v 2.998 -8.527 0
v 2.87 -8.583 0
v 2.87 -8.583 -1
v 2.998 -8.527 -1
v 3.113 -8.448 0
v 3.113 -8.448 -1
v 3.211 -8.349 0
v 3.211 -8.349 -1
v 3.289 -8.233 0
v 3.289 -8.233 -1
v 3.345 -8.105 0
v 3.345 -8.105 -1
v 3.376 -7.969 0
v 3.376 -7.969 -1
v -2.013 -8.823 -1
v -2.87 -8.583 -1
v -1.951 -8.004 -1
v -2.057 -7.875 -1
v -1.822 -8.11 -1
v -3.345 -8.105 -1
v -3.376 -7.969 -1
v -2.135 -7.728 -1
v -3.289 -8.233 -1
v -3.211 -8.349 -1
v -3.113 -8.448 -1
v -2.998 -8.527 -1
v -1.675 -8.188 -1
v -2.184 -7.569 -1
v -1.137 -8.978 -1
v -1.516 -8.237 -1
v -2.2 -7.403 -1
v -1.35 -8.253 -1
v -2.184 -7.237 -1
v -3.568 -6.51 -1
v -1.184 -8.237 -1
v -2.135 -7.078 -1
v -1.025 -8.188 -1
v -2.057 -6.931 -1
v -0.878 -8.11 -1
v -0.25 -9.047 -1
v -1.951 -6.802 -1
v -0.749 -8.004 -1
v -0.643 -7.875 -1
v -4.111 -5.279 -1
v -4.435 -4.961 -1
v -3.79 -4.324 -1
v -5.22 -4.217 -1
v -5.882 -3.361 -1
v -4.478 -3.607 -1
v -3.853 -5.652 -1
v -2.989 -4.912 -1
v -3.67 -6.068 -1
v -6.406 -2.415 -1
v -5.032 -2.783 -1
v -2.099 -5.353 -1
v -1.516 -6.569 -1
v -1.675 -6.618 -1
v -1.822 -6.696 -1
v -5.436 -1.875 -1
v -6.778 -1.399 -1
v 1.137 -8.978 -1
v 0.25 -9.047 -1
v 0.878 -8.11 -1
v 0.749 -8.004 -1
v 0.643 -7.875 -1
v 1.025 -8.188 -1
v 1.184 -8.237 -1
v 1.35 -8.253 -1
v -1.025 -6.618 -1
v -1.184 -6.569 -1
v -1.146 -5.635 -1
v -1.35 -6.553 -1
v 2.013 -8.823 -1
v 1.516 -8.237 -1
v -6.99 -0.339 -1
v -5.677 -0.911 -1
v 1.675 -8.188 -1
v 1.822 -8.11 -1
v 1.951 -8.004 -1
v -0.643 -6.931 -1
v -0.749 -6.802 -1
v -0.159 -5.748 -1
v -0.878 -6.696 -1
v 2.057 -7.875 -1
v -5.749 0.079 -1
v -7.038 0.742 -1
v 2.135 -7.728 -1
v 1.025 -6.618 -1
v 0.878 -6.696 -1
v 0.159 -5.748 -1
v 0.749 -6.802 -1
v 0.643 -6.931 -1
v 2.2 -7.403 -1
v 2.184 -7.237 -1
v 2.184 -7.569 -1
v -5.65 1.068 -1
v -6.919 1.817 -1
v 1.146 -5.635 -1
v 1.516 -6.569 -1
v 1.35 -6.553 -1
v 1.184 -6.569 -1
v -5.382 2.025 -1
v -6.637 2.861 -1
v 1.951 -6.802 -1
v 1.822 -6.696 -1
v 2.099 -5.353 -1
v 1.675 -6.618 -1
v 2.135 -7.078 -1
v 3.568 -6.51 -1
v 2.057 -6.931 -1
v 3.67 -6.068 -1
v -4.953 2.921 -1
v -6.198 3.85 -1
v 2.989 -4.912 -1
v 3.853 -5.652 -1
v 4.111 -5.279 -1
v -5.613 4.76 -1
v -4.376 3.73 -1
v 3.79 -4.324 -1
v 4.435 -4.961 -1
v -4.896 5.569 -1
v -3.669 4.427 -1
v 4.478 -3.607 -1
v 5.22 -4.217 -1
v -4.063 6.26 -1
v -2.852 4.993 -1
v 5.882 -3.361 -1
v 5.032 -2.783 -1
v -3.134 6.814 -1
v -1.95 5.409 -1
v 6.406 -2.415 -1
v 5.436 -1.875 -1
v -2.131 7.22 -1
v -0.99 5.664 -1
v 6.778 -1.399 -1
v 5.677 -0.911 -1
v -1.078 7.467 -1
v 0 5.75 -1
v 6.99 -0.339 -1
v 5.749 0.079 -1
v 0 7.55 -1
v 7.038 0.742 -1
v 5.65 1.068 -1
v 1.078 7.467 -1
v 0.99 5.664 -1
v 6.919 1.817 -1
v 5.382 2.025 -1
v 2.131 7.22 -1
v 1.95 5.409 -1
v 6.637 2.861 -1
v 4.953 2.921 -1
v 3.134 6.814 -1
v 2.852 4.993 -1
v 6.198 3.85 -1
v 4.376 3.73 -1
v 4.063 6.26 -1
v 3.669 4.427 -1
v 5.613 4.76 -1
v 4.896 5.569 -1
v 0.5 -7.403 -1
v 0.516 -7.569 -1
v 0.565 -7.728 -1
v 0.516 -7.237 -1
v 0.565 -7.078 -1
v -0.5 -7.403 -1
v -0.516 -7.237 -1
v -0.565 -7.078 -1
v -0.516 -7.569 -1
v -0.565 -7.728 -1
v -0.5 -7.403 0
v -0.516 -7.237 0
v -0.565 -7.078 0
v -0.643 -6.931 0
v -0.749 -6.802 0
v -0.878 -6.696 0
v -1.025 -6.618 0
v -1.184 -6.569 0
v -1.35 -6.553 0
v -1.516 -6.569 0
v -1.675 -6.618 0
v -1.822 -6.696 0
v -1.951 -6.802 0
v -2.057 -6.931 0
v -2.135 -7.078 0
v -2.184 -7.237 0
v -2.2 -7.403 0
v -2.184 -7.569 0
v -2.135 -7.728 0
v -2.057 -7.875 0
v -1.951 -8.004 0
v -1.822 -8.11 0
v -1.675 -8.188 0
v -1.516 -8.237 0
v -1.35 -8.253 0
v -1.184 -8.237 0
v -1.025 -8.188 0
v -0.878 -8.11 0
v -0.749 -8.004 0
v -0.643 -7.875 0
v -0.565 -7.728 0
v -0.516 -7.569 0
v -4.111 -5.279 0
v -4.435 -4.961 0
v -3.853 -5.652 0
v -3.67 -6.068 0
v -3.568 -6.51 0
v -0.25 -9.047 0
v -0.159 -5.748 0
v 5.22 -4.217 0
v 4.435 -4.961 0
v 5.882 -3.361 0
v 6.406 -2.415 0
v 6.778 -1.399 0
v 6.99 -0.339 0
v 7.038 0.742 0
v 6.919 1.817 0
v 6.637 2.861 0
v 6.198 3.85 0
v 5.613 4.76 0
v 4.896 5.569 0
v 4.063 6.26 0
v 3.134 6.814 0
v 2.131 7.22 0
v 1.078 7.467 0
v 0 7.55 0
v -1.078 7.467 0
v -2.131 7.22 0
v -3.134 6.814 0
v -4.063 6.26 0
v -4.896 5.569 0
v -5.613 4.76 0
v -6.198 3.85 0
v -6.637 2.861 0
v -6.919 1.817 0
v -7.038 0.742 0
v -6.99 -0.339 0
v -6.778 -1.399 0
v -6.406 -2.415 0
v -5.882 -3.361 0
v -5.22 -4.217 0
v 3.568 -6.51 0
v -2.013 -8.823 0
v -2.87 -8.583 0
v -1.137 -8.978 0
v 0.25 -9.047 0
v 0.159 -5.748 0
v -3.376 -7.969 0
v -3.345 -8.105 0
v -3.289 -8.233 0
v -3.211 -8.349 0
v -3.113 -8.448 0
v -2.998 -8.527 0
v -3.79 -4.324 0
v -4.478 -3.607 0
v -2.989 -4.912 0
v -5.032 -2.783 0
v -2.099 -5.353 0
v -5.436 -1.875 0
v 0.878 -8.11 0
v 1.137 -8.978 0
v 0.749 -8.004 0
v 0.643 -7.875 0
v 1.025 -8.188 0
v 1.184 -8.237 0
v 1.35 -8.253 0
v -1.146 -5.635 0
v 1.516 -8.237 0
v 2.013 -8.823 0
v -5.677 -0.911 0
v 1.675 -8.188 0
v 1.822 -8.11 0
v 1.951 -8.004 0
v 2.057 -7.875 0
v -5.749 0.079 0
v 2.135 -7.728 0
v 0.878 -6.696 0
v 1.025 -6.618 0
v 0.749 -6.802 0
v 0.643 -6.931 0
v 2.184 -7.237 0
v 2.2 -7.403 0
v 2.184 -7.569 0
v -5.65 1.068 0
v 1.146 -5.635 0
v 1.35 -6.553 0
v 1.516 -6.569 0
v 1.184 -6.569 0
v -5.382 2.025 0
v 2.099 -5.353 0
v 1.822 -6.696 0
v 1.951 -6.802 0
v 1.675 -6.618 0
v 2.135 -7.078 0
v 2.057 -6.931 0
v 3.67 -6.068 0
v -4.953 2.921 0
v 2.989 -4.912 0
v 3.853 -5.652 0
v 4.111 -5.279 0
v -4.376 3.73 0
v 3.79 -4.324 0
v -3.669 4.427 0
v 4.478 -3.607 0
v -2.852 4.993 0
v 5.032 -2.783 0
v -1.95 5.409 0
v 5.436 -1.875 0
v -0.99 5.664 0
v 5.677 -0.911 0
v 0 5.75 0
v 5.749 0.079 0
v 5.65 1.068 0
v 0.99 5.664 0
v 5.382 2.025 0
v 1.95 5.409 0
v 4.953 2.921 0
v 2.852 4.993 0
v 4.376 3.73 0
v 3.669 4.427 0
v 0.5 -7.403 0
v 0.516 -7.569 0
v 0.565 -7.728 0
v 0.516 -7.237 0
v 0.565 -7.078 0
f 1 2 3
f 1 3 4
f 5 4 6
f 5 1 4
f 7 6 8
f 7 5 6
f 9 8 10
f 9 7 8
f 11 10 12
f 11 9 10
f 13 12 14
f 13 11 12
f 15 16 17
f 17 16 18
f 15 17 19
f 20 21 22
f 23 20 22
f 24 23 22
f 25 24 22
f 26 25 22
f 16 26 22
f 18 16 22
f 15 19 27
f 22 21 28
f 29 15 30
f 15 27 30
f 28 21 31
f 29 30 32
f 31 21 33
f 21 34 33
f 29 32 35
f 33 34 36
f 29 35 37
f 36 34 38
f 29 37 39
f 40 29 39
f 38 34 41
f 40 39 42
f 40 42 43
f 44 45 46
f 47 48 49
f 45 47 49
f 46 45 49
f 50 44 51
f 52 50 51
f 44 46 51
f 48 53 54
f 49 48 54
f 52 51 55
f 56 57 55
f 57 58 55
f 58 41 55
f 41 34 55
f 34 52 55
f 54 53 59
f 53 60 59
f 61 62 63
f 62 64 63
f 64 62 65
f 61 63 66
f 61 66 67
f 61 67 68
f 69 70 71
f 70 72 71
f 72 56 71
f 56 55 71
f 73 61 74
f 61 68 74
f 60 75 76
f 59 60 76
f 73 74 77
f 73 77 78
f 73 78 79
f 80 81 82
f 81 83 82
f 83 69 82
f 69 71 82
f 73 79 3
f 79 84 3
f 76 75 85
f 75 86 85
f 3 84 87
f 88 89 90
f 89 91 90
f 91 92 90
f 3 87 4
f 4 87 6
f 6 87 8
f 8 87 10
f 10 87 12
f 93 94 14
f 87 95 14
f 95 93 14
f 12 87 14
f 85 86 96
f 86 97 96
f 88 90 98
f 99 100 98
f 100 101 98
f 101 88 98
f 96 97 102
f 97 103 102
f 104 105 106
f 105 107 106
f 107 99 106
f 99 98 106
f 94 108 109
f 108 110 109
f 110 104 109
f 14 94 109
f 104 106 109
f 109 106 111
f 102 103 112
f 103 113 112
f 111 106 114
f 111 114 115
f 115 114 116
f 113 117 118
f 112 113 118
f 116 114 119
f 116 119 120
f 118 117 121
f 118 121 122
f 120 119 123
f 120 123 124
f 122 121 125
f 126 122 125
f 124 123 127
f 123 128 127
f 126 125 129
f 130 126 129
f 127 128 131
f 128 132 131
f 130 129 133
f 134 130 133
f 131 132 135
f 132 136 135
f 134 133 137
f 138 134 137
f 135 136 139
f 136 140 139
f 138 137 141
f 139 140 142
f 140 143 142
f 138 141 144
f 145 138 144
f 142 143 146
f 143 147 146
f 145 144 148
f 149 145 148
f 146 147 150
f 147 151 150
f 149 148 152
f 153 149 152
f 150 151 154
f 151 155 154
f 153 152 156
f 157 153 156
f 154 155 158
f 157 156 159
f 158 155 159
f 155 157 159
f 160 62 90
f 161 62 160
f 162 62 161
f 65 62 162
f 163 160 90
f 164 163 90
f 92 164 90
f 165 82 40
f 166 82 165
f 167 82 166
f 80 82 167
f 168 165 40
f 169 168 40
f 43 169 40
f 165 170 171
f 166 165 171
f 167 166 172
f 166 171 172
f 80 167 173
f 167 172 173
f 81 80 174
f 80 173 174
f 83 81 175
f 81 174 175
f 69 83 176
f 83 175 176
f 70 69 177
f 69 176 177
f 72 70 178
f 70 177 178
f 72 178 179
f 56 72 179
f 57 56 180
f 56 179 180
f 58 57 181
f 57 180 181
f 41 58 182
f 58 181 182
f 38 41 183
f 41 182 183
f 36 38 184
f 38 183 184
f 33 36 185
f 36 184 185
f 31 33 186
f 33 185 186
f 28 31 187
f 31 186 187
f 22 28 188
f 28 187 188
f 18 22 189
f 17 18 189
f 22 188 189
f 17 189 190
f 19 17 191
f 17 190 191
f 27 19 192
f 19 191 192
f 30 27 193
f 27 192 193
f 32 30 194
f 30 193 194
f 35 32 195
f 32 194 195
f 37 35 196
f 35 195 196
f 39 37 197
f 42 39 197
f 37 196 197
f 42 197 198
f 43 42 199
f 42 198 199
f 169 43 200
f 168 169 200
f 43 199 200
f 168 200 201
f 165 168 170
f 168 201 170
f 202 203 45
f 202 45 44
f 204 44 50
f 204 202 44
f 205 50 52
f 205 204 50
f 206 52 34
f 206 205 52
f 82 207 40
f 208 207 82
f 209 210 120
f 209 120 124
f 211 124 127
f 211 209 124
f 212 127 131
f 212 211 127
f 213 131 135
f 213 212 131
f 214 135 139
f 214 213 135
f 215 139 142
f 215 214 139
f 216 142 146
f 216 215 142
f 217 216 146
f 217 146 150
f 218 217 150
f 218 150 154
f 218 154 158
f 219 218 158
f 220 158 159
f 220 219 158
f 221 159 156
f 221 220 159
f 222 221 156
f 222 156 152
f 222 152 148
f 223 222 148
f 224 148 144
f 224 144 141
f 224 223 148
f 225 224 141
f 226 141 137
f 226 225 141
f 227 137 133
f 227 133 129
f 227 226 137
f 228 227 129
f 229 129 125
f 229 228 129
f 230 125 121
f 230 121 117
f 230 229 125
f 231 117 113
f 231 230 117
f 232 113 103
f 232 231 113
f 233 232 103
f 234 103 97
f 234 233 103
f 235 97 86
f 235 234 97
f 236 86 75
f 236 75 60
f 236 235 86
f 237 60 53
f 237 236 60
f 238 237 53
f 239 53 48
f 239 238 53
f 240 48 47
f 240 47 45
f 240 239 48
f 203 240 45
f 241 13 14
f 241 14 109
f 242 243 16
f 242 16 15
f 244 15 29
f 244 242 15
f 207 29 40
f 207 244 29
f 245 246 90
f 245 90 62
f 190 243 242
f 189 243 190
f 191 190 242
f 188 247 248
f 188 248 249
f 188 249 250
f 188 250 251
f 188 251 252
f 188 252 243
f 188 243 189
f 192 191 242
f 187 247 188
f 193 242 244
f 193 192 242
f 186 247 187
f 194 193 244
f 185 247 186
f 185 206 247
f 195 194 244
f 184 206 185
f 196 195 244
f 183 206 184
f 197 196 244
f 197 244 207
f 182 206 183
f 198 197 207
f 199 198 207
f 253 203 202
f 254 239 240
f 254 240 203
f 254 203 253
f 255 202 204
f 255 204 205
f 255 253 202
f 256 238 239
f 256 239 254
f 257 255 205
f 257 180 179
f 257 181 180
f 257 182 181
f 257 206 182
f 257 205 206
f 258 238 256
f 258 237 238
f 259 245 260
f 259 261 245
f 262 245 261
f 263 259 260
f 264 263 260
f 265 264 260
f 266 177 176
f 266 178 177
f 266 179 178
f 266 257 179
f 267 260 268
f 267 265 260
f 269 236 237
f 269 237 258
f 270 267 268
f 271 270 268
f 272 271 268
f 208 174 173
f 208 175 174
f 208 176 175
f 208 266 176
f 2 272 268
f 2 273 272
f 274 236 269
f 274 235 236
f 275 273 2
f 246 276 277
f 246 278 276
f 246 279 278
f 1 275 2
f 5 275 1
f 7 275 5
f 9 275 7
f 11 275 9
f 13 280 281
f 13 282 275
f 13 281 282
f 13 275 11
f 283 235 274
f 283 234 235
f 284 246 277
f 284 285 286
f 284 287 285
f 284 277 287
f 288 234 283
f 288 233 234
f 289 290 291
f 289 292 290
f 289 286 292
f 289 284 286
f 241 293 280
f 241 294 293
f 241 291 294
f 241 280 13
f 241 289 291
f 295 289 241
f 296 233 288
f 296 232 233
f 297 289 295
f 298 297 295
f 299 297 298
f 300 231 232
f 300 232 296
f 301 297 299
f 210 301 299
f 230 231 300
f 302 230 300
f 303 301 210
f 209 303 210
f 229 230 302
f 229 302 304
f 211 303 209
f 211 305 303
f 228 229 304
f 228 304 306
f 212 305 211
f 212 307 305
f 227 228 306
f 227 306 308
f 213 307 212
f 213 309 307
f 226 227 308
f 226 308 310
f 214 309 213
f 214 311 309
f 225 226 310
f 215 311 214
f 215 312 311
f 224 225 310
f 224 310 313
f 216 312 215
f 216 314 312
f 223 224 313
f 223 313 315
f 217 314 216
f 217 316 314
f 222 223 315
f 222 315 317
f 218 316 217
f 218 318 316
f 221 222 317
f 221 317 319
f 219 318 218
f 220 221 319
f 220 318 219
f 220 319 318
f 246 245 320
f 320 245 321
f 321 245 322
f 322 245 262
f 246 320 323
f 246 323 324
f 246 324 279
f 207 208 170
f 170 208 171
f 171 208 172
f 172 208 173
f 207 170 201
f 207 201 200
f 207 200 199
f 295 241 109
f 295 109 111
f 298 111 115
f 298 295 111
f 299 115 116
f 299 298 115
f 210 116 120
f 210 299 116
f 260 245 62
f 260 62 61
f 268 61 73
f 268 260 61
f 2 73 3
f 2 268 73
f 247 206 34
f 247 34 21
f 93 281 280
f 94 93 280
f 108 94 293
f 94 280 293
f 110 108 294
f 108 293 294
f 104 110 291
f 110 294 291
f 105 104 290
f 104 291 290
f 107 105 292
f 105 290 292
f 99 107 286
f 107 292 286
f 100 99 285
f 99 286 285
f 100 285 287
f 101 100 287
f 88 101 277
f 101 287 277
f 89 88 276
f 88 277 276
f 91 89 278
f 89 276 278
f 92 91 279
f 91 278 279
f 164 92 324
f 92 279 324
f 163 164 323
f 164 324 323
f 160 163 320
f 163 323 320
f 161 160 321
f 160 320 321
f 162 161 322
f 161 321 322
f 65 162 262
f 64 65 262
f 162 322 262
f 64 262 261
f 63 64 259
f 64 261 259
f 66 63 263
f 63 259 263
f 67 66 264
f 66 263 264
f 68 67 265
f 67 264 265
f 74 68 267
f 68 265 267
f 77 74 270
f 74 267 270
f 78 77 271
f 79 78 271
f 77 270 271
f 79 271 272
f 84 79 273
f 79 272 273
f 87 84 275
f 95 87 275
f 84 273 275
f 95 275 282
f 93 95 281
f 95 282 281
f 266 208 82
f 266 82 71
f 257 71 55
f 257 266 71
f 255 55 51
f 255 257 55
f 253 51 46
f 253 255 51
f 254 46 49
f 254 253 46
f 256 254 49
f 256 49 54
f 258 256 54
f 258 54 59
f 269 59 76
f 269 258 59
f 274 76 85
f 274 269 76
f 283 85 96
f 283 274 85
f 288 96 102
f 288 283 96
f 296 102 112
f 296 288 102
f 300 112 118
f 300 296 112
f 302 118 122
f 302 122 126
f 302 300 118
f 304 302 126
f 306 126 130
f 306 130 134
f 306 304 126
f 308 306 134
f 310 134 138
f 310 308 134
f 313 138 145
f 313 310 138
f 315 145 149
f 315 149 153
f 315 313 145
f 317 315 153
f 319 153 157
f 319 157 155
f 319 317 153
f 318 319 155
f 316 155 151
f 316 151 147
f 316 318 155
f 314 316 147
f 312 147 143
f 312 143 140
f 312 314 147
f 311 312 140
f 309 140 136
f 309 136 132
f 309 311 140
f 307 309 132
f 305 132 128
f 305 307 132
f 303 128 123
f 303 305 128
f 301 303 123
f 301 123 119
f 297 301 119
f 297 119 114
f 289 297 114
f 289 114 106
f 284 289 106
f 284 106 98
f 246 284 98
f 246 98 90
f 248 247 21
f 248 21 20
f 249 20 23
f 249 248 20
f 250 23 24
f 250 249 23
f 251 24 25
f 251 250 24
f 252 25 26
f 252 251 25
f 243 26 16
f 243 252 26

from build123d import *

# Parameters (mm, degrees)
BODYSKE_R  = 0.85
BODY_DEPTH = 1


with BuildPart() as part:
    # BodySke → Body (new body)
    with BuildSketch(Plane.XY):
        with BuildLine():
            Line((0.158839779, -5.747805662), (0.25, -9.046546302))
            ThreePointArc((0.25, -9.046546302), (1.577173754, -8.9115107), (2.870077767, -8.582840649))
            ThreePointArc((2.870077767, -8.582840649), (3.210901949, -8.348665738), (3.375809664, -7.969450157))
            Line((3.375809664, -7.969450157), (3.567937091, -6.510097462))
            ThreePointArc((3.567937091, -6.510097462), (3.852773959, -5.652106923), (4.435031511, -4.960546405))
            ThreePointArc((4.435031511, -4.960546405), (0, 7.55), (-4.435031511, -4.960546405))
            ThreePointArc((-4.435031511, -4.960546405), (-3.852773959, -5.652106923), (-3.567937091, -6.510097462))
            Line((-3.567937091, -6.510097462), (-3.375809664, -7.969450157))
            ThreePointArc((-3.375809664, -7.969450157), (-3.210901949, -8.348665738), (-2.870077767, -8.582840649))
            ThreePointArc((-2.870077767, -8.582840649), (-1.577173754, -8.9115107), (-0.25, -9.046546302))
            Line((-0.25, -9.046546302), (-0.158839779, -5.747805662))
            ThreePointArc((-0.158839779, -5.747805662), (0, 5.75), (0.158839779, -5.747805662))
        make_face()
        with Locations((1.35, -7.402913278)):
            Circle(BODYSKE_R, mode=Mode.SUBTRACT)
        with Locations((-1.35, -7.402913278)):
            Circle(BODYSKE_R, mode=Mode.SUBTRACT)
    extrude(amount=-BODY_DEPTH)


solid = part.part
